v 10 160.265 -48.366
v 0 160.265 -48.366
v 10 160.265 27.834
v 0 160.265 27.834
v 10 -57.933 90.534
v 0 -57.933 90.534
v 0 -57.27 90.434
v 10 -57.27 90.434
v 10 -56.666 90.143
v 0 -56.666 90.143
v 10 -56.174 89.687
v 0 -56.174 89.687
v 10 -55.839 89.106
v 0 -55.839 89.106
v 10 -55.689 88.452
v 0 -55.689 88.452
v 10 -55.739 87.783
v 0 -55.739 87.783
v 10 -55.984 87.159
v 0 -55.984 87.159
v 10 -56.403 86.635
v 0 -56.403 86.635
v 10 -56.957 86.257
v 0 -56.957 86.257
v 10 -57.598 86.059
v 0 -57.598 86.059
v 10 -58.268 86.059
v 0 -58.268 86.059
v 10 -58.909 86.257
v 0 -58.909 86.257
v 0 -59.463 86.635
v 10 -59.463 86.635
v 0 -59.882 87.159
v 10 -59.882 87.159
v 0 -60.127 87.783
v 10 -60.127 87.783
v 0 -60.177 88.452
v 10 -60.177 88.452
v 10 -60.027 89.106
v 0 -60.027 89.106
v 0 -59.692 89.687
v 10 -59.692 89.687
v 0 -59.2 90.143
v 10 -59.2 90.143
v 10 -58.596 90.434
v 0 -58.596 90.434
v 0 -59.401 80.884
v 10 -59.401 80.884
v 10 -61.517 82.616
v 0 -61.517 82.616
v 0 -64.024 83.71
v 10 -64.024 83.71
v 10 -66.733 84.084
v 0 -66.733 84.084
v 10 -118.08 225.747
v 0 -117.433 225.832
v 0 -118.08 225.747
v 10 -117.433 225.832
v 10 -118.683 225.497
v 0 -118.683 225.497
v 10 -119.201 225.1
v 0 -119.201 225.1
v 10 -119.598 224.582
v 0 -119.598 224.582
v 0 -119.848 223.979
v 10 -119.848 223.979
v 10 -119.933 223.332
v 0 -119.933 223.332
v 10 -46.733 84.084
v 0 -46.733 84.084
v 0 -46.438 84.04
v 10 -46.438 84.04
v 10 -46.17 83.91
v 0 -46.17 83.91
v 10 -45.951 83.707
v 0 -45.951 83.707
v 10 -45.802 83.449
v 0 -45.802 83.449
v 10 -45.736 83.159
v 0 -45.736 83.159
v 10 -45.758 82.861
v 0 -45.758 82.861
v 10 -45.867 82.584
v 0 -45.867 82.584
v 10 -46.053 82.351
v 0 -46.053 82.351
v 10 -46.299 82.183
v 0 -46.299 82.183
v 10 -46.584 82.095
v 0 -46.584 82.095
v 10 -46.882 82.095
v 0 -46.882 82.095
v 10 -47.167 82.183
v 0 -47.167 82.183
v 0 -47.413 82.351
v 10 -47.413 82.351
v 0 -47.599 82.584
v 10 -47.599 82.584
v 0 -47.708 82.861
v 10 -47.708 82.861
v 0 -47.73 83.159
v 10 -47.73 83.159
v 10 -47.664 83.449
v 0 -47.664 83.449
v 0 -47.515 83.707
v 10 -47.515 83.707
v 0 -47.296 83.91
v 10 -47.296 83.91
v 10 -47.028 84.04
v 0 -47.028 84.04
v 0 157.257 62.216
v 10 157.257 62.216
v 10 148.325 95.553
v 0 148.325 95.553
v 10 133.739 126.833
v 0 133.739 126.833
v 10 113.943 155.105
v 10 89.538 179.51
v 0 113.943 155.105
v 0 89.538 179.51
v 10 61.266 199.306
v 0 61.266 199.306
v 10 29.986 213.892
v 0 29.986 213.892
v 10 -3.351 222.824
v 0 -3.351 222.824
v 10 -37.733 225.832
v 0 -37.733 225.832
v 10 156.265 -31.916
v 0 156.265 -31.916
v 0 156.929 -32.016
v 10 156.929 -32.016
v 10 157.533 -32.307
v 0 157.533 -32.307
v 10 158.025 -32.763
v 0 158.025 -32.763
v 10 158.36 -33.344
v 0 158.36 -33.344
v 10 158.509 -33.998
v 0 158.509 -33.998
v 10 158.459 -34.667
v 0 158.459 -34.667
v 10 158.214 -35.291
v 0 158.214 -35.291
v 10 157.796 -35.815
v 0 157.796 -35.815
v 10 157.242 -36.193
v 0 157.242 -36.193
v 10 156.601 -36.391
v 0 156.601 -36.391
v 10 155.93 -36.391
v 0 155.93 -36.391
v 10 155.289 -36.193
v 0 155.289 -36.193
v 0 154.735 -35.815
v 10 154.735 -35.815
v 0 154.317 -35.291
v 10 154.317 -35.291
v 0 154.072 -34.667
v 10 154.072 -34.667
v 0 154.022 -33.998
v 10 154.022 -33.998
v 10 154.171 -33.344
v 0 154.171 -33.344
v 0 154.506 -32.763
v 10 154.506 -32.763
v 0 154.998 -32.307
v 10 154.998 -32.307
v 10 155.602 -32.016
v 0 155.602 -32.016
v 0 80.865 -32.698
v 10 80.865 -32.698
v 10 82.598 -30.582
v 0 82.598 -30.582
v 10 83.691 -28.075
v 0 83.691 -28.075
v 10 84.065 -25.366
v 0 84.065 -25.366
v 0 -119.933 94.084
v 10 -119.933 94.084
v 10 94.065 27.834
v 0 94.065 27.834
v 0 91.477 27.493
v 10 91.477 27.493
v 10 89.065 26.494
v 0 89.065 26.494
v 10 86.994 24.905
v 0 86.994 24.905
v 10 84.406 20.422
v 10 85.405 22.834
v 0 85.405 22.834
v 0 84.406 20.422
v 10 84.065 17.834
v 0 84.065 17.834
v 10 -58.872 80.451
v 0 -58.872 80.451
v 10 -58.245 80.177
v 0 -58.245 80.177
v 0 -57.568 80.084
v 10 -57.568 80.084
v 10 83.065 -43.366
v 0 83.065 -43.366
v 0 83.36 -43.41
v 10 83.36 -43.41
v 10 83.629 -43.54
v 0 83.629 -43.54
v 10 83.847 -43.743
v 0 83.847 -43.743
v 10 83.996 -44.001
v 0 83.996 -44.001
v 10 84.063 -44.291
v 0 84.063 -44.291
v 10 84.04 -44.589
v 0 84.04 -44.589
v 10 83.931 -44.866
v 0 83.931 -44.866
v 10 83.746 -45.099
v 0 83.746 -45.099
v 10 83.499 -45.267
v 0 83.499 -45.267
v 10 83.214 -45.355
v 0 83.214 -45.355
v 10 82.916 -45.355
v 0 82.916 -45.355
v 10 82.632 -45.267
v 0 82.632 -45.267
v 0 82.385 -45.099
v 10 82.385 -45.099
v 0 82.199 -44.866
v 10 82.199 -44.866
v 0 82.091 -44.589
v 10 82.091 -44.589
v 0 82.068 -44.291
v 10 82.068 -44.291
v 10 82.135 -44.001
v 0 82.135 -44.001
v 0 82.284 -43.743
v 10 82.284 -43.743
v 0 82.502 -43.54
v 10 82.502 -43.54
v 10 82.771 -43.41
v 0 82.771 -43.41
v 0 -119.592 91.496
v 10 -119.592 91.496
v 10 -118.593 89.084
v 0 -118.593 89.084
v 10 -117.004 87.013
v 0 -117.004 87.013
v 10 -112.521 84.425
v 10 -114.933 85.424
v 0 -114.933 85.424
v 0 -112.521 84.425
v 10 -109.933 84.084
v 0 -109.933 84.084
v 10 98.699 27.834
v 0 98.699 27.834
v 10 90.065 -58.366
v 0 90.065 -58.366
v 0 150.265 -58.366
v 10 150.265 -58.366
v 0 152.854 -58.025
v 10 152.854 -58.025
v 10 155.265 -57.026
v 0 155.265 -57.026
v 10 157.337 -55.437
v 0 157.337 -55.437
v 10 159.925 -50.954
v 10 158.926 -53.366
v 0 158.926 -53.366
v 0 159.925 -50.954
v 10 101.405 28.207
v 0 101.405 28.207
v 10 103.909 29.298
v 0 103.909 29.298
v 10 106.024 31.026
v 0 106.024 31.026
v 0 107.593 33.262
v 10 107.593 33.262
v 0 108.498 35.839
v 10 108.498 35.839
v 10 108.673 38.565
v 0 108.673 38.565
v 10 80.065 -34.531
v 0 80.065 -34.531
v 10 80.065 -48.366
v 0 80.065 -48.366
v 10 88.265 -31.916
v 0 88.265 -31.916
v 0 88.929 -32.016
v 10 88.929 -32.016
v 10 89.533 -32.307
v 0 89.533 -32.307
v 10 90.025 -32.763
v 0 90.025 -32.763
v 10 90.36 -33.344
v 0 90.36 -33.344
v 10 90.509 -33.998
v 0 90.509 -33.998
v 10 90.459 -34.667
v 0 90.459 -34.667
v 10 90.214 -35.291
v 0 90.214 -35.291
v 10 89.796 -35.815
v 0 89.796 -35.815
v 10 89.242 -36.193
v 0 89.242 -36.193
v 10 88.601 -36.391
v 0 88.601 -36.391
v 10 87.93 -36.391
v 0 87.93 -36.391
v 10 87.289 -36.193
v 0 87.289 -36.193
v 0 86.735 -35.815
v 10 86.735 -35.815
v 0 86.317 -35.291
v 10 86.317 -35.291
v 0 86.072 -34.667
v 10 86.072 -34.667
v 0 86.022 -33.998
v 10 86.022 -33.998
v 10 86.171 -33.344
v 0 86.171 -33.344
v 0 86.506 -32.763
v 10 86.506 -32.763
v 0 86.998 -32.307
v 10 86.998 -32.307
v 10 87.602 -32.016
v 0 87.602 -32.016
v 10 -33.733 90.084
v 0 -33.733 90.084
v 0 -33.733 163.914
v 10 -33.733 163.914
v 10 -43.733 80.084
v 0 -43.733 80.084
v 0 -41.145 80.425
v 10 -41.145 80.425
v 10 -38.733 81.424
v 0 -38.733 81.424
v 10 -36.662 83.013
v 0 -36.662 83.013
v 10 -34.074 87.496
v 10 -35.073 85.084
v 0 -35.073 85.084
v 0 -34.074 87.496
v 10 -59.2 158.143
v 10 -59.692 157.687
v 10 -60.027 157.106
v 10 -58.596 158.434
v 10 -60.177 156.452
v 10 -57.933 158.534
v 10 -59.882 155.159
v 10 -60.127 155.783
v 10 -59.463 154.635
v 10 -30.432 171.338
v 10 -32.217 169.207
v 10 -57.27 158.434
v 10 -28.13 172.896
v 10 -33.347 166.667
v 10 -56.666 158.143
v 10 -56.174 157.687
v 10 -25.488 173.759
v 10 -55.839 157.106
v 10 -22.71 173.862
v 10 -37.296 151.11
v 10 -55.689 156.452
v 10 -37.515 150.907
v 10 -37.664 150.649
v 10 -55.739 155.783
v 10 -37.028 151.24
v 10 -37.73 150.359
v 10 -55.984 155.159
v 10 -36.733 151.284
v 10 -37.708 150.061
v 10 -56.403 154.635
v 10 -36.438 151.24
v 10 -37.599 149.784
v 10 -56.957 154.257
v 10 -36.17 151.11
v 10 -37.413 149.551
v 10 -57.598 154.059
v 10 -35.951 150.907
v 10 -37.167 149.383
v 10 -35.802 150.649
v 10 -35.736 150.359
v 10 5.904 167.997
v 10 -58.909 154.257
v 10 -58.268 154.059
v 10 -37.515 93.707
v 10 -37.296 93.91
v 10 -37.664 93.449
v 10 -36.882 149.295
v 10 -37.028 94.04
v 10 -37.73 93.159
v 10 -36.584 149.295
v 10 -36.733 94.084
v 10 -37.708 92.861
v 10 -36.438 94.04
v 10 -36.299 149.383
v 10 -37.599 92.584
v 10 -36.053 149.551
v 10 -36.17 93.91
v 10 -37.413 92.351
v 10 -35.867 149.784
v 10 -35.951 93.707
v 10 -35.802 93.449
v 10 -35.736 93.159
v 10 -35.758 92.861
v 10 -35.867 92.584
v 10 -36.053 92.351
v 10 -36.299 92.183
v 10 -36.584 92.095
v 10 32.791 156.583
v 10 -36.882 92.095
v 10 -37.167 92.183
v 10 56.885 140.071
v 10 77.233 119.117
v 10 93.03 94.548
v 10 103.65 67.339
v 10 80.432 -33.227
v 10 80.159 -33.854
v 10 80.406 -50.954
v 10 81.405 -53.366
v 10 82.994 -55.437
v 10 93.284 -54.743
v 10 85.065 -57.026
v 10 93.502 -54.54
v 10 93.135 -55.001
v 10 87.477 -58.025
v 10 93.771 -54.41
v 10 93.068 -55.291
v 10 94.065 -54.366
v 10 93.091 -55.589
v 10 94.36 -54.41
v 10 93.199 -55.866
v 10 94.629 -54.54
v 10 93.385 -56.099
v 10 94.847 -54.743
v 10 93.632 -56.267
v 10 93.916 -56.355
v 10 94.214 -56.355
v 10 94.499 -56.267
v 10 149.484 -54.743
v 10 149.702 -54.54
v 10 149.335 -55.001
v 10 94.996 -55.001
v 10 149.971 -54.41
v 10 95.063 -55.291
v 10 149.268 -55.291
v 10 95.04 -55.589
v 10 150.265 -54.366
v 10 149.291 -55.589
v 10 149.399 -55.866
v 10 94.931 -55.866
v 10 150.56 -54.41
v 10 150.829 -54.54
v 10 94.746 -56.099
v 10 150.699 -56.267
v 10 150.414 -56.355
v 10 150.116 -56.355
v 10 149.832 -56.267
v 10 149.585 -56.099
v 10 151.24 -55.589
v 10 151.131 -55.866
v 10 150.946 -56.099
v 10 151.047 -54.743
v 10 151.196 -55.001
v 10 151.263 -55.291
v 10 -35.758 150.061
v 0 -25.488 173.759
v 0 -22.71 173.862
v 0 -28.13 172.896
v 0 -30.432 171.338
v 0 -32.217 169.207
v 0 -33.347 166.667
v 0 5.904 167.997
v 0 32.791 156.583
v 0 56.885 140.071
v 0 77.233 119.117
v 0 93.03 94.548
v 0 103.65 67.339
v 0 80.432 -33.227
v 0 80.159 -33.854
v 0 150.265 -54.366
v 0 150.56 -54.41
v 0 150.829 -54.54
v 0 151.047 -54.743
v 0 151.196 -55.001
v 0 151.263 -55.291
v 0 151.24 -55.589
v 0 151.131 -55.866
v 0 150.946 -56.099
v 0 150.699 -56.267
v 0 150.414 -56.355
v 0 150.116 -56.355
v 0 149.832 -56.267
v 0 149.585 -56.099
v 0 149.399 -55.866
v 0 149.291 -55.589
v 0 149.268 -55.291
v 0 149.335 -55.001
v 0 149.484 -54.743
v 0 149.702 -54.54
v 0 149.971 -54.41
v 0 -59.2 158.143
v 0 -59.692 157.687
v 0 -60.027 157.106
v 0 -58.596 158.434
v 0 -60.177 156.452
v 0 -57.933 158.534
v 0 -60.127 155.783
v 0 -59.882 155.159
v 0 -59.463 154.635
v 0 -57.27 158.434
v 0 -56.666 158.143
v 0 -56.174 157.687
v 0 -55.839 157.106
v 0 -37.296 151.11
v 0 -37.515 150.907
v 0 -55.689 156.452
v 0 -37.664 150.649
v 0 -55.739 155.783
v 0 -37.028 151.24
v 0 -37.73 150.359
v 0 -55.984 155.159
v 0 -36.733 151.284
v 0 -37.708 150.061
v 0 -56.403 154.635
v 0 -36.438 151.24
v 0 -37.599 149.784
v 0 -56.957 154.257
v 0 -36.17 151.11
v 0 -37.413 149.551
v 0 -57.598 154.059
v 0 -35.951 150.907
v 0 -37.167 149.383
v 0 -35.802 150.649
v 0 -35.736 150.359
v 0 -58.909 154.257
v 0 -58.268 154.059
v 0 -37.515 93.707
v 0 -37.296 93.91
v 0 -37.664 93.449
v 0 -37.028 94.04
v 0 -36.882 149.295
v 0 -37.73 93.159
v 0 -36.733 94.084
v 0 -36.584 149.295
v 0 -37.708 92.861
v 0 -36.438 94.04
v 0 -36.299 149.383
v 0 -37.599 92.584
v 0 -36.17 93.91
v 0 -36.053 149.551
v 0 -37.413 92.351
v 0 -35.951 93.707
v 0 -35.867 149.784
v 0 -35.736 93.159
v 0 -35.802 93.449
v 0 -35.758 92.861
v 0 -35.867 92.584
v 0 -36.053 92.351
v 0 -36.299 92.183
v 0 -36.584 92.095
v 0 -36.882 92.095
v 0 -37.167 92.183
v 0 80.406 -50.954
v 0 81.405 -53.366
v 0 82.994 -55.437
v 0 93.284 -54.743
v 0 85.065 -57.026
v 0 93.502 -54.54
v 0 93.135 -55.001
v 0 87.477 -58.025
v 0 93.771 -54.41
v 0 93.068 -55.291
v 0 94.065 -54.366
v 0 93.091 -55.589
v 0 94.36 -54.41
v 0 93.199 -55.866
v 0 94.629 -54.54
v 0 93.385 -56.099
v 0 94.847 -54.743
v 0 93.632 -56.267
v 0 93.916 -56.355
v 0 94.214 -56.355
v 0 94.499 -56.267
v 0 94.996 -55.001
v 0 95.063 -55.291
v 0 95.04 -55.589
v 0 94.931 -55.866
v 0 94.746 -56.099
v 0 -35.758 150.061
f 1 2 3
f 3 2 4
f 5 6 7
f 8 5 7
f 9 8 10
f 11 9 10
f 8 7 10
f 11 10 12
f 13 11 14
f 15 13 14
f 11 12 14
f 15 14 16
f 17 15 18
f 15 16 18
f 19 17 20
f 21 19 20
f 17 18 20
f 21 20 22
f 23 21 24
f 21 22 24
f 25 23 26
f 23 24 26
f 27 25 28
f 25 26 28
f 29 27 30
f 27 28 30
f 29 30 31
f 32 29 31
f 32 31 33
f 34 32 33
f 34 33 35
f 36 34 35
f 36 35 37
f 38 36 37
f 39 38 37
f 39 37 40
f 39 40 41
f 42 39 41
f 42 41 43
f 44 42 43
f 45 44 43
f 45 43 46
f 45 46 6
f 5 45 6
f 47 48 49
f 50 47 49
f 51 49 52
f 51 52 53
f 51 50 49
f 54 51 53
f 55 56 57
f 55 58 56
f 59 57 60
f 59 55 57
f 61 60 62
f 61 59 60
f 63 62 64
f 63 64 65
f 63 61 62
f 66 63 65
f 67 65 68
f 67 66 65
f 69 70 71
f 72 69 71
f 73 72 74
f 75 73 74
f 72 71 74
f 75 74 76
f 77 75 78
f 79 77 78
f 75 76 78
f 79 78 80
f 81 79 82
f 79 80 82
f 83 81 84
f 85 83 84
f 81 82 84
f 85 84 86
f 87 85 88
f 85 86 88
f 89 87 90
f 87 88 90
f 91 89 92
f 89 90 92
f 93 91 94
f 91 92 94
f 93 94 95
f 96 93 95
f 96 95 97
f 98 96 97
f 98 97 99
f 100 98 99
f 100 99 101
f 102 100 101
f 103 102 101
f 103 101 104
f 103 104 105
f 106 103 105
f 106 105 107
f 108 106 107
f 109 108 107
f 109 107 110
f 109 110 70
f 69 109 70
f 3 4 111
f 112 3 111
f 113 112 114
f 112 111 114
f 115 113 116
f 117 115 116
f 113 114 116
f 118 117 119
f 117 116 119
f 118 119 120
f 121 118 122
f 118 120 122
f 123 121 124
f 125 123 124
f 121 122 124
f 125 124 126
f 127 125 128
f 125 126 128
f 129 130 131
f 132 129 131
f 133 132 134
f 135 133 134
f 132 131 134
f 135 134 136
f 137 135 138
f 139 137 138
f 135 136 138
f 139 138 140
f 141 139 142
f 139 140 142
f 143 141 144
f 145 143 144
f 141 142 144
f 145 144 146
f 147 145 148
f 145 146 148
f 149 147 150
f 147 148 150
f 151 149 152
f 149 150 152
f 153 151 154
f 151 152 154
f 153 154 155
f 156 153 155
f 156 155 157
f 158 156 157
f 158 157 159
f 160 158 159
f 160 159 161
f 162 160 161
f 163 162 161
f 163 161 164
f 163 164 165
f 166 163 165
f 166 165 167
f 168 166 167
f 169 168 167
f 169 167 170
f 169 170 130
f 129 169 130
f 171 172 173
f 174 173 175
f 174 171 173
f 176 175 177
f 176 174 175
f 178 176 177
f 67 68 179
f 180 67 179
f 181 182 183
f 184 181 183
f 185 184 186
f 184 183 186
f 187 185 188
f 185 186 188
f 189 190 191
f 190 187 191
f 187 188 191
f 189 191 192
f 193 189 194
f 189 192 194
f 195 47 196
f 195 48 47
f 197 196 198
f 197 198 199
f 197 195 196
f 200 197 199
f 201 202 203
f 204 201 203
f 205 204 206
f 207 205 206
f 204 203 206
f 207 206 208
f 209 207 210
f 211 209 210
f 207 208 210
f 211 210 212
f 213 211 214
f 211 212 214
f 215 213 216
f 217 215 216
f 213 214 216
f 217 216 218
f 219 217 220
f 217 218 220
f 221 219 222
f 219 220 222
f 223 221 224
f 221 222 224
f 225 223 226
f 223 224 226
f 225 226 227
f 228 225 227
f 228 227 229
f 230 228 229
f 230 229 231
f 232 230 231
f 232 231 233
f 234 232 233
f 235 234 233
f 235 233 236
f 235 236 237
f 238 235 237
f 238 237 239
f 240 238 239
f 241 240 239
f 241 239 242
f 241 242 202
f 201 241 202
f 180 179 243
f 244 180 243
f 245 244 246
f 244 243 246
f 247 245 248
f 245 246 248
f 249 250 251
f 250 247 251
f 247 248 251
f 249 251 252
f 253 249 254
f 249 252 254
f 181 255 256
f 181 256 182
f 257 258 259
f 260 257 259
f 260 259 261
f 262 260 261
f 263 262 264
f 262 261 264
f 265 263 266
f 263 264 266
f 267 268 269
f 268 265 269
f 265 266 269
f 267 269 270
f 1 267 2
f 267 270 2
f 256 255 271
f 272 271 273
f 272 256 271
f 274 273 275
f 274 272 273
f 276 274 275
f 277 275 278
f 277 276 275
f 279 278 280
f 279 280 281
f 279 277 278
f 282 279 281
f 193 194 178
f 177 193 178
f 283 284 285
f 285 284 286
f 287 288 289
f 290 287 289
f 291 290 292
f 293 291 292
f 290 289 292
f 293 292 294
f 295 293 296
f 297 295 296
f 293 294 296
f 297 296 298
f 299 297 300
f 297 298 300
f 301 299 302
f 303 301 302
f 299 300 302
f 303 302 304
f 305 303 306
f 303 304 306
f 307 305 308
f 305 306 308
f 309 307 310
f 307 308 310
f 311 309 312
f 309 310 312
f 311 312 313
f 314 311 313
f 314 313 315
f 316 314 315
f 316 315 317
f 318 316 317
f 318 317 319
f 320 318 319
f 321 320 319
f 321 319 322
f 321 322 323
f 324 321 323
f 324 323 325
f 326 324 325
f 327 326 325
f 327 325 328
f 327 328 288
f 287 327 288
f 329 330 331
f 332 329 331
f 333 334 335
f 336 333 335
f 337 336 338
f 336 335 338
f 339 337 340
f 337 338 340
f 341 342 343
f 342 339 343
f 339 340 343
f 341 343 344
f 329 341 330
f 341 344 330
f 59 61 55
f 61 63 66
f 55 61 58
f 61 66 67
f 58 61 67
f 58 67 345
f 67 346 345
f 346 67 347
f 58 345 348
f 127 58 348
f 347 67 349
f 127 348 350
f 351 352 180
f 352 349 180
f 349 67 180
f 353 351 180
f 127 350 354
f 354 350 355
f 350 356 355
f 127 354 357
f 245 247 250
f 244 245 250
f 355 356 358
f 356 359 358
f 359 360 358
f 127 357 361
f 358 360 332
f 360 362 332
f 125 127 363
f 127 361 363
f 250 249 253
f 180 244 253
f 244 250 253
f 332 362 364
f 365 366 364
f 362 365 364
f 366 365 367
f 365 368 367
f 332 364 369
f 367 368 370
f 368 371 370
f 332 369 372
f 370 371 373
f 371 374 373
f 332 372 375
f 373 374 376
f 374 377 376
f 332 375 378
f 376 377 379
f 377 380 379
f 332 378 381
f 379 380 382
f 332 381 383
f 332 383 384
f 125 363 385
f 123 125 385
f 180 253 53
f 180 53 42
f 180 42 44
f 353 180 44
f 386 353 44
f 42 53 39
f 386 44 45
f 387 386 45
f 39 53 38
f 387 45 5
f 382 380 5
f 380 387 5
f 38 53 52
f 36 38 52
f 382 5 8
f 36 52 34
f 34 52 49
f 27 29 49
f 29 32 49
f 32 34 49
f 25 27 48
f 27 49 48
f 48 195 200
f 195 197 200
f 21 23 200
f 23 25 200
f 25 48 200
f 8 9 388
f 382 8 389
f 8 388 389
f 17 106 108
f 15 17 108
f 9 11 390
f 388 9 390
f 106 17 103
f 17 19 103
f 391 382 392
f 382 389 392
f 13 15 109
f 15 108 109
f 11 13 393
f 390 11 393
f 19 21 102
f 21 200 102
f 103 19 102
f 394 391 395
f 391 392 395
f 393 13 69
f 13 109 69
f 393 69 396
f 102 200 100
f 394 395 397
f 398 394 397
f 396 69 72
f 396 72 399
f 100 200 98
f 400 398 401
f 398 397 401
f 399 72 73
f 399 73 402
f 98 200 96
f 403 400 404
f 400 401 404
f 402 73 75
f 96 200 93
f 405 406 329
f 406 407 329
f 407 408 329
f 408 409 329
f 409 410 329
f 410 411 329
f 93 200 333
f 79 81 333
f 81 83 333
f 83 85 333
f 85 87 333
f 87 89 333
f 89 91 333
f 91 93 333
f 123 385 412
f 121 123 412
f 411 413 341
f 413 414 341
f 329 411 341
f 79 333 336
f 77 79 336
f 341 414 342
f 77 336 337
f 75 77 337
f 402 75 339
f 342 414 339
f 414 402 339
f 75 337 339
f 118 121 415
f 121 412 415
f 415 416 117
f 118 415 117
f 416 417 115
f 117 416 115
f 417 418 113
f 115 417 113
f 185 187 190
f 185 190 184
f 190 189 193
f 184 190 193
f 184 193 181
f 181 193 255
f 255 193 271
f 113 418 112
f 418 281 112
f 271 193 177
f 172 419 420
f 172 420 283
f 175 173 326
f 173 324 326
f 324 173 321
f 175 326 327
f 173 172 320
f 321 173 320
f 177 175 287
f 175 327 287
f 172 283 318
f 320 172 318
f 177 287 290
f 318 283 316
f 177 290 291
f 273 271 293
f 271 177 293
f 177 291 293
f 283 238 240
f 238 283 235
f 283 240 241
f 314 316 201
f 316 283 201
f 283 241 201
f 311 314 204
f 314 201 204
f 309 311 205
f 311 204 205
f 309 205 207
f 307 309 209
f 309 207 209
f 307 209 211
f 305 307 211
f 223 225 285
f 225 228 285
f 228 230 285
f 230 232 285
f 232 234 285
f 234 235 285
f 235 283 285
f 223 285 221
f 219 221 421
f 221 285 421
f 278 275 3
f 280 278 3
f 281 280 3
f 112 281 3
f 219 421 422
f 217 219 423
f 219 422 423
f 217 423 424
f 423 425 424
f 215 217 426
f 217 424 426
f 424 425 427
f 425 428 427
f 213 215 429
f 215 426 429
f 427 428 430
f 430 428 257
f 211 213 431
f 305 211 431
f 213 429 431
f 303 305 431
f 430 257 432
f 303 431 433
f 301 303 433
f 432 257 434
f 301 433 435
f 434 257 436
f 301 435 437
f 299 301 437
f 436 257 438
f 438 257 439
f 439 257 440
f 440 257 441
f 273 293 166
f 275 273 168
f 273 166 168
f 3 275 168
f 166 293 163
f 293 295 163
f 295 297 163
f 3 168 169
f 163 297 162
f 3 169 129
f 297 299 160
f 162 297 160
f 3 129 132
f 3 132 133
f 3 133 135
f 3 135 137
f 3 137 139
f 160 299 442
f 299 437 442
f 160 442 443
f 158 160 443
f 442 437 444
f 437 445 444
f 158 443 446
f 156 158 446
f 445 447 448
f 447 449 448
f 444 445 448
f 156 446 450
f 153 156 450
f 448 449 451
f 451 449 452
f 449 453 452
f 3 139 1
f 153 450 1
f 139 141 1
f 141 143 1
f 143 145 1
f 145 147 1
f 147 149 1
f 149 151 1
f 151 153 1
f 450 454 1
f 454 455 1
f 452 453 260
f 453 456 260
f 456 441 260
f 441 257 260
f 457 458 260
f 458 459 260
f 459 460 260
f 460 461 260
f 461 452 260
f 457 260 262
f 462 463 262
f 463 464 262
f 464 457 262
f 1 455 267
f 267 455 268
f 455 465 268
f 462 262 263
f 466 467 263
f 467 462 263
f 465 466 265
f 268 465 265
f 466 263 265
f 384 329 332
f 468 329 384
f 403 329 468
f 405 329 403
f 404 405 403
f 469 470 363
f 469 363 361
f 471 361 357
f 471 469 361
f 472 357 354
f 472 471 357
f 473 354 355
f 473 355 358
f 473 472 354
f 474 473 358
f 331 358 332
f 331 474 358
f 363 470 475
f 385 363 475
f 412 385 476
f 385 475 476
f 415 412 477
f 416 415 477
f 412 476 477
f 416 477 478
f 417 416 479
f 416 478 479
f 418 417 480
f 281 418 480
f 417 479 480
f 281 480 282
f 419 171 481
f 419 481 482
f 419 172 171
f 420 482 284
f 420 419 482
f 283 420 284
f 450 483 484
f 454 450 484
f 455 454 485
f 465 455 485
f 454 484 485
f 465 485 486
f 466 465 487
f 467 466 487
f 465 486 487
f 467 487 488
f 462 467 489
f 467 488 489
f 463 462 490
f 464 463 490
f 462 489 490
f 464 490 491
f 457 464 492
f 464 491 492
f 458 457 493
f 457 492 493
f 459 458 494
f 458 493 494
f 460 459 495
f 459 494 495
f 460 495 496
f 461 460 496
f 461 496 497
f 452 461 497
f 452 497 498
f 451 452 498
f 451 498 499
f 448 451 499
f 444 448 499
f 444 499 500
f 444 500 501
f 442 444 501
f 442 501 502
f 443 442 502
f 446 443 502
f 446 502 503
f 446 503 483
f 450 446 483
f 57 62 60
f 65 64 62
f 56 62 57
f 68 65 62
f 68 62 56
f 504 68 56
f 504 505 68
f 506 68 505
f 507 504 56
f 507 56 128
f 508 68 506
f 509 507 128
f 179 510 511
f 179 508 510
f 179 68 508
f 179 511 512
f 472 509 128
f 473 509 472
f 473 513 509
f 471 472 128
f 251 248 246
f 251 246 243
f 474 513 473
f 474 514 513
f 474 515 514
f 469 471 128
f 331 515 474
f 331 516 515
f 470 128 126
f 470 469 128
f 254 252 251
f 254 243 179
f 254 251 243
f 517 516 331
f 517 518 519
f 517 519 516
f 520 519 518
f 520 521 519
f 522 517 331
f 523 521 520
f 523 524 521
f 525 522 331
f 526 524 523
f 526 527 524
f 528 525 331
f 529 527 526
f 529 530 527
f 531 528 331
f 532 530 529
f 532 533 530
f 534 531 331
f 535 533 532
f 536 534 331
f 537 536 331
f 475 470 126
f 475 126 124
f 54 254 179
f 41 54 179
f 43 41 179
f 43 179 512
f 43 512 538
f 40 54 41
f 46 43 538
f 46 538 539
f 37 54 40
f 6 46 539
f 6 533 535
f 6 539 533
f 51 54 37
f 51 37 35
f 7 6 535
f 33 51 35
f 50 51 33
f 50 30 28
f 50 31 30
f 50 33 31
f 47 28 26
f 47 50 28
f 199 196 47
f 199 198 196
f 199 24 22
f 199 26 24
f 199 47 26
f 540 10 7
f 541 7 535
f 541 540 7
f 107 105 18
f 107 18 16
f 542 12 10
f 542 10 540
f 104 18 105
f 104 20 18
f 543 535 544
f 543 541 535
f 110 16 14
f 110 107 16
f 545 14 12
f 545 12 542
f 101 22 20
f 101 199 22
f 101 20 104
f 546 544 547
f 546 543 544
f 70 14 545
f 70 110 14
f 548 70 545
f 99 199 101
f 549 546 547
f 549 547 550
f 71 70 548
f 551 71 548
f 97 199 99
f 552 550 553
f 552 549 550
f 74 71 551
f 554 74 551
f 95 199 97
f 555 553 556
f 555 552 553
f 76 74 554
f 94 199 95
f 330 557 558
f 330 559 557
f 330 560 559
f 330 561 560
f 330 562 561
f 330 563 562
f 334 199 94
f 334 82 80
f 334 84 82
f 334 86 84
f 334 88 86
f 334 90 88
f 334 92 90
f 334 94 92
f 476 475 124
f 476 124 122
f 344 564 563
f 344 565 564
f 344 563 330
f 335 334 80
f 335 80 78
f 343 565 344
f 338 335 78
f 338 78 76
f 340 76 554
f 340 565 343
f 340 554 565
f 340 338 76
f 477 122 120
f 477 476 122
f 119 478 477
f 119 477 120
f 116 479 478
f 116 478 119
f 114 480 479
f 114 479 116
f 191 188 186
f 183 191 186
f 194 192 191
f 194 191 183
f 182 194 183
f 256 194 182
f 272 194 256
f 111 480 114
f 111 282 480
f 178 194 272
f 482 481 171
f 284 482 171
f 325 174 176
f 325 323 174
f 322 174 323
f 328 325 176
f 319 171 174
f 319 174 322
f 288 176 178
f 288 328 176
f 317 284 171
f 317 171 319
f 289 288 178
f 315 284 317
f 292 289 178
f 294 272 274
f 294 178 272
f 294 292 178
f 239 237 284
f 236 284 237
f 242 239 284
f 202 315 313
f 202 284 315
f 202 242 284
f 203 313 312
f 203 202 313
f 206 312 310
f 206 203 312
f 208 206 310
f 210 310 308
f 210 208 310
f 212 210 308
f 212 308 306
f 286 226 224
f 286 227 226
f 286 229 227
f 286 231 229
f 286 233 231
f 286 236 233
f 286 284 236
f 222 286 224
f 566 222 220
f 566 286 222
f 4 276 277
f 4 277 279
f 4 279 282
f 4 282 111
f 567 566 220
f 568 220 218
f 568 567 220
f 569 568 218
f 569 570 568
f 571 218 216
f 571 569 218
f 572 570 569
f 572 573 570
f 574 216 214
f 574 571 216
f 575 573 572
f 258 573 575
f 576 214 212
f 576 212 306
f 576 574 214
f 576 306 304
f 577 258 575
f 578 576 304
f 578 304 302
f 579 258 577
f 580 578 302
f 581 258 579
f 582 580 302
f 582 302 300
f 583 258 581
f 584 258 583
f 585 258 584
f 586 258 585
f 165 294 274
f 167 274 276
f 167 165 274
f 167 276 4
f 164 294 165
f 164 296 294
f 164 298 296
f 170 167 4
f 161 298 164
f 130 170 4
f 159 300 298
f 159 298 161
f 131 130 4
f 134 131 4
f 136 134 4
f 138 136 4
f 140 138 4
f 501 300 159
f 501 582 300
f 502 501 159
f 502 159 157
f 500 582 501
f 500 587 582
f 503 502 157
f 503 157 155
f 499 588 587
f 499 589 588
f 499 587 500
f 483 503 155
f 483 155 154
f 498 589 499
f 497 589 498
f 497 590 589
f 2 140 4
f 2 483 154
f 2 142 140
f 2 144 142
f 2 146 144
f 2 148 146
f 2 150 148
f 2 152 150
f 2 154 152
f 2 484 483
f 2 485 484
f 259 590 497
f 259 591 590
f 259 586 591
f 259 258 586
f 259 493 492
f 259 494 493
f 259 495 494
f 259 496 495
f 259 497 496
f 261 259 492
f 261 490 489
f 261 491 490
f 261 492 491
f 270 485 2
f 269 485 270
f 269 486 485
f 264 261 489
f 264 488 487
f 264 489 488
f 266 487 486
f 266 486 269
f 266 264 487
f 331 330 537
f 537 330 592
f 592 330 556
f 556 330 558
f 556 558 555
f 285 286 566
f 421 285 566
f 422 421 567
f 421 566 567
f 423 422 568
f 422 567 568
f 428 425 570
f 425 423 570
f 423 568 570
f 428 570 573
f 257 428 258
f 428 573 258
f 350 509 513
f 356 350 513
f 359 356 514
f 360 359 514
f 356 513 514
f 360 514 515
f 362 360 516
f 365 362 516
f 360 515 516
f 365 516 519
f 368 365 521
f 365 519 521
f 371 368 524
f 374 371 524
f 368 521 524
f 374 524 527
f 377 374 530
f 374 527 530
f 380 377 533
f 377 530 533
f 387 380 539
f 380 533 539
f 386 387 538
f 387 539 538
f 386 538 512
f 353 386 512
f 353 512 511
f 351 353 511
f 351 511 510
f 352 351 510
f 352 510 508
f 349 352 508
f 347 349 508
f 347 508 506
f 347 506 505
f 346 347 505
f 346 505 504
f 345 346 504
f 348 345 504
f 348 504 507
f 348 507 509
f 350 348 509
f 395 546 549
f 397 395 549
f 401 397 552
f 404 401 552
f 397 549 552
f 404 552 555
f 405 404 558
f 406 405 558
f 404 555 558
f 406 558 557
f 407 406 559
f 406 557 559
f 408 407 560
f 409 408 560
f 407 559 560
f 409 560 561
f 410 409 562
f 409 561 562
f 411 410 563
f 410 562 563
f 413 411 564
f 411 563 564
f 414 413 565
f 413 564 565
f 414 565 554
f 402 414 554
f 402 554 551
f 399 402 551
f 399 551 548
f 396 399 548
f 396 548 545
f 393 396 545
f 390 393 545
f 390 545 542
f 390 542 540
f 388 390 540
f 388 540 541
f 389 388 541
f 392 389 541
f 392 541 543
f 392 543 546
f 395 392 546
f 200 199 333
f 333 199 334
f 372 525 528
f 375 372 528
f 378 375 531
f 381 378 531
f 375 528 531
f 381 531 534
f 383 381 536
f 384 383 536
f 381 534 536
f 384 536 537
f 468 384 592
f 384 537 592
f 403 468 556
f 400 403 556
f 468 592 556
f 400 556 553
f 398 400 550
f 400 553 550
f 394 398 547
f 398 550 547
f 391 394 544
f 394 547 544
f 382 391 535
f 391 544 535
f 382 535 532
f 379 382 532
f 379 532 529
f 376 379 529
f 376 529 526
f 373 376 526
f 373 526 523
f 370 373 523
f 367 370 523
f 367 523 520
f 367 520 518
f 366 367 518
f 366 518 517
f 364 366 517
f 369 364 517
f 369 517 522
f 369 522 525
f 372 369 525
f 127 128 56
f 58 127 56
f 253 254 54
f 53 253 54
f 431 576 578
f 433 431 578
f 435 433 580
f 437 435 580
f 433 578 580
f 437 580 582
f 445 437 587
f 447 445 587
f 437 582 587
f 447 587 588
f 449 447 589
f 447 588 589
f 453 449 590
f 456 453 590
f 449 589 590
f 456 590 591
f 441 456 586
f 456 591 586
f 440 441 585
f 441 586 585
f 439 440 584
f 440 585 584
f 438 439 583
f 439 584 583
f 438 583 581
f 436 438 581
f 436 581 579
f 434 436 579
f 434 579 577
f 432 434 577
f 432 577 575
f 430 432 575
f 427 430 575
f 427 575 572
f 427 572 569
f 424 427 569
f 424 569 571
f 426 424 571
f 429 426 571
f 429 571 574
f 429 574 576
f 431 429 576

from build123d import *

# Parameters (mm, degrees)
BOSS_EXTRUDE1_DEPTH   = 10
M4_CLEARANCE_HOLE1_D  = 4.5
F_2_0MM_DOWEL_HOLE1_D = 2
FILLET1_R             = 10
FILLET2_R             = 2.5


with BuildPart() as part:
    # Sketch1 → Boss-Extrude1 (new body)
    with BuildSketch(Plane(origin=(0, 0, 0), x_dir=(0, 0, -1), z_dir=(1, 0, 0))):
        with BuildLine():
            Line((-27.833971588, 109.065439697), (-27.833971588, 84.065439697))
            Line((-27.833971588, 84.065439697), (33.366028214, 84.065439697))
            Line((33.366028214, 84.065439697), (33.366028214, 80.065439697))
            Line((33.366028214, 80.065439697), (58.366028214, 80.065439697))
            Line((58.366028214, 80.065439697), (58.366028214, 160.265439697))
            Line((58.366028214, 160.265439697), (54.366028214, 160.265439697))
            Line((54.366028214, 160.265439697), (-27.833971588, 160.265439697))
            ThreePointArc((-27.833971588, 160.265439697), (-167.840009366, 102.273040036), (-225.832409027, -37.732997742))
            Line((-225.832409027, -37.732997742), (-225.832409027, -119.932997544))
            Line((-225.832409027, -119.932997544), (-84.083971786, -119.932997544))
            Line((-84.083971786, -119.932997544), (-84.083971786, -58.732997742))
            Line((-84.083971786, -58.732997742), (-80.083971786, -58.732997742))
            Line((-80.083971786, -58.732997742), (-80.083971786, -33.732997742))
            Line((-80.083971786, -33.732997742), (-174.577902415, -33.732997742))
            ThreePointArc((-174.577902415, -33.732997742), (-130.212161367, 67.473881749), (-27.833971588, 109.065439697))
        make_face()
    extrude(amount=BOSS_EXTRUDE1_DEPTH)

    # M4 Clearance Hole1 (through all)
    with Locations(Plane(origin=(10, 0, 0), x_dir=(0, 0, -1), z_dir=(1, 0, 0))):
        with Locations((-156.283971786, -57.932997742), (-88.283971786, -57.932997742), (34.166028214, 156.265439697), (34.166028214, 88.265439697)):
            Hole(M4_CLEARANCE_HOLE1_D / 2)

    # Ø2.0mm Dowel Hole1 (through all)
    with Locations(Plane(origin=(10, 0, 0), x_dir=(0, 0, -1), z_dir=(1, 0, 0))):
        with Locations((44.366028214, 83.065439697), (55.366028214, 94.065439697), (55.366028214, 150.265439697), (-150.283971786, -36.732997742), (-93.083971786, -36.732997742), (-83.083971786, -46.732997742)):
            Hole(F_2_0MM_DOWEL_HOLE1_D / 2)

    # Fillet1
    # the kernel refuses this fillet: 10 mm, written as the material it adds along each edge
    with BuildSketch(Plane(origin=(0, -58.732997742, 84.083971786), x_dir=(0, 0, -1), z_dir=(1, 0, 0))) as fillet1_piece_1:
        with BuildLine():
            CenterArc((10, -8), FILLET1_R, 126.869897646, 53.130102354)
            Line((0, -8), (0, 0))
            Line((0, 0), (4, 0))
        make_face()
    extrude(amount=10)
    with BuildSketch(Plane(origin=(0, 84.065439697, -33.366028214), x_dir=(0, 0, 1), z_dir=(1, 0, 0))) as fillet1_piece_2:
        with BuildLine():
            CenterArc((8, 10), FILLET1_R, 216.869897646, 53.130102354)
            Line((0, 4), (0, 0))
            Line((0, 0), (8, 0))
        make_face()
    extrude(amount=10)
    with BuildSketch(Plane(origin=(0, -33.732997742, 174.577902415), x_dir=(0, 0.9978956594350473, -0.06484021036896881), z_dir=(1, 0, 0))) as fillet1_piece_3:
        with BuildLine():
            CenterArc((10.670397133, -9.992919204), FILLET1_R, 87.843724259, 95.873954258)
            Line((0.691440539, -10.641321308), (0, 0))
            ThreePointArc((0, 0), (5.523324707, 0.103944977), (11.046649415, 0))
        make_face()
    extrude(amount=10)
    with BuildSketch(Plane(origin=(0, 109.065439697, 27.833971588), x_dir=(0, -1, 0), z_dir=(1, 0, 0))) as fillet1_piece_4:
        with BuildLine():
            CenterArc((10.365990837, -10), FILLET1_R, 90, 94.192074979)
            ThreePointArc((0.392744859, -10.731002502), (0.098219073, -5.369093574), (0, 0))
            Line((0, 0), (10.365990837, 0))
        make_face()
    extrude(amount=10)
    # the kernel refuses this fillet: 10 mm, written as the material it takes off along each edge
    with BuildSketch(Plane(origin=(-25, -119.932997544, 84.083971786), x_dir=(0, 1, 0), z_dir=(1, 0, 0)), Plane(origin=(-25, -33.732997742, 80.083971786), x_dir=(0, 0, 1), z_dir=(1, 0, 0))) as fillet1_2_piece_1:
        with BuildLine():
            CenterArc((FILLET1_R, FILLET1_R), FILLET1_R, 180, 90)
            Line((0, FILLET1_R), (0, 0))
            Line((0, 0), (FILLET1_R, 0))
        make_face()
    extrude(amount=60, mode=Mode.SUBTRACT)
    with BuildSketch(Plane(origin=(-25, 84.065439697, 27.833971588), x_dir=(0, 1, 0), z_dir=(1, 0, 0)), Plane(origin=(-25, 160.265439697, -58.366028214), x_dir=(0, -1, 0), z_dir=(1, 0, 0)), Plane(origin=(-25, 80.065439697, -58.366028214), x_dir=(0, 0, 1), z_dir=(1, 0, 0))) as fillet1_2_piece_2:
        with BuildLine():
            CenterArc((FILLET1_R, -FILLET1_R), FILLET1_R, 90, 90)
            Line((0, -FILLET1_R), (0, 0))
            Line((0, 0), (FILLET1_R, 0))
        make_face()
    extrude(amount=60, mode=Mode.SUBTRACT)

    # Fillet2
    fillet2_edges = [part.edges().sort_by_distance(p)[0] for p in [
        (5, 80.065439697, -33.366028214),
        (5, -58.732997742, 80.083971786),
        (5, -119.932997544, 225.832409027),
    ]]
    fillet(fillet2_edges, radius=FILLET2_R)


solid = part.part
